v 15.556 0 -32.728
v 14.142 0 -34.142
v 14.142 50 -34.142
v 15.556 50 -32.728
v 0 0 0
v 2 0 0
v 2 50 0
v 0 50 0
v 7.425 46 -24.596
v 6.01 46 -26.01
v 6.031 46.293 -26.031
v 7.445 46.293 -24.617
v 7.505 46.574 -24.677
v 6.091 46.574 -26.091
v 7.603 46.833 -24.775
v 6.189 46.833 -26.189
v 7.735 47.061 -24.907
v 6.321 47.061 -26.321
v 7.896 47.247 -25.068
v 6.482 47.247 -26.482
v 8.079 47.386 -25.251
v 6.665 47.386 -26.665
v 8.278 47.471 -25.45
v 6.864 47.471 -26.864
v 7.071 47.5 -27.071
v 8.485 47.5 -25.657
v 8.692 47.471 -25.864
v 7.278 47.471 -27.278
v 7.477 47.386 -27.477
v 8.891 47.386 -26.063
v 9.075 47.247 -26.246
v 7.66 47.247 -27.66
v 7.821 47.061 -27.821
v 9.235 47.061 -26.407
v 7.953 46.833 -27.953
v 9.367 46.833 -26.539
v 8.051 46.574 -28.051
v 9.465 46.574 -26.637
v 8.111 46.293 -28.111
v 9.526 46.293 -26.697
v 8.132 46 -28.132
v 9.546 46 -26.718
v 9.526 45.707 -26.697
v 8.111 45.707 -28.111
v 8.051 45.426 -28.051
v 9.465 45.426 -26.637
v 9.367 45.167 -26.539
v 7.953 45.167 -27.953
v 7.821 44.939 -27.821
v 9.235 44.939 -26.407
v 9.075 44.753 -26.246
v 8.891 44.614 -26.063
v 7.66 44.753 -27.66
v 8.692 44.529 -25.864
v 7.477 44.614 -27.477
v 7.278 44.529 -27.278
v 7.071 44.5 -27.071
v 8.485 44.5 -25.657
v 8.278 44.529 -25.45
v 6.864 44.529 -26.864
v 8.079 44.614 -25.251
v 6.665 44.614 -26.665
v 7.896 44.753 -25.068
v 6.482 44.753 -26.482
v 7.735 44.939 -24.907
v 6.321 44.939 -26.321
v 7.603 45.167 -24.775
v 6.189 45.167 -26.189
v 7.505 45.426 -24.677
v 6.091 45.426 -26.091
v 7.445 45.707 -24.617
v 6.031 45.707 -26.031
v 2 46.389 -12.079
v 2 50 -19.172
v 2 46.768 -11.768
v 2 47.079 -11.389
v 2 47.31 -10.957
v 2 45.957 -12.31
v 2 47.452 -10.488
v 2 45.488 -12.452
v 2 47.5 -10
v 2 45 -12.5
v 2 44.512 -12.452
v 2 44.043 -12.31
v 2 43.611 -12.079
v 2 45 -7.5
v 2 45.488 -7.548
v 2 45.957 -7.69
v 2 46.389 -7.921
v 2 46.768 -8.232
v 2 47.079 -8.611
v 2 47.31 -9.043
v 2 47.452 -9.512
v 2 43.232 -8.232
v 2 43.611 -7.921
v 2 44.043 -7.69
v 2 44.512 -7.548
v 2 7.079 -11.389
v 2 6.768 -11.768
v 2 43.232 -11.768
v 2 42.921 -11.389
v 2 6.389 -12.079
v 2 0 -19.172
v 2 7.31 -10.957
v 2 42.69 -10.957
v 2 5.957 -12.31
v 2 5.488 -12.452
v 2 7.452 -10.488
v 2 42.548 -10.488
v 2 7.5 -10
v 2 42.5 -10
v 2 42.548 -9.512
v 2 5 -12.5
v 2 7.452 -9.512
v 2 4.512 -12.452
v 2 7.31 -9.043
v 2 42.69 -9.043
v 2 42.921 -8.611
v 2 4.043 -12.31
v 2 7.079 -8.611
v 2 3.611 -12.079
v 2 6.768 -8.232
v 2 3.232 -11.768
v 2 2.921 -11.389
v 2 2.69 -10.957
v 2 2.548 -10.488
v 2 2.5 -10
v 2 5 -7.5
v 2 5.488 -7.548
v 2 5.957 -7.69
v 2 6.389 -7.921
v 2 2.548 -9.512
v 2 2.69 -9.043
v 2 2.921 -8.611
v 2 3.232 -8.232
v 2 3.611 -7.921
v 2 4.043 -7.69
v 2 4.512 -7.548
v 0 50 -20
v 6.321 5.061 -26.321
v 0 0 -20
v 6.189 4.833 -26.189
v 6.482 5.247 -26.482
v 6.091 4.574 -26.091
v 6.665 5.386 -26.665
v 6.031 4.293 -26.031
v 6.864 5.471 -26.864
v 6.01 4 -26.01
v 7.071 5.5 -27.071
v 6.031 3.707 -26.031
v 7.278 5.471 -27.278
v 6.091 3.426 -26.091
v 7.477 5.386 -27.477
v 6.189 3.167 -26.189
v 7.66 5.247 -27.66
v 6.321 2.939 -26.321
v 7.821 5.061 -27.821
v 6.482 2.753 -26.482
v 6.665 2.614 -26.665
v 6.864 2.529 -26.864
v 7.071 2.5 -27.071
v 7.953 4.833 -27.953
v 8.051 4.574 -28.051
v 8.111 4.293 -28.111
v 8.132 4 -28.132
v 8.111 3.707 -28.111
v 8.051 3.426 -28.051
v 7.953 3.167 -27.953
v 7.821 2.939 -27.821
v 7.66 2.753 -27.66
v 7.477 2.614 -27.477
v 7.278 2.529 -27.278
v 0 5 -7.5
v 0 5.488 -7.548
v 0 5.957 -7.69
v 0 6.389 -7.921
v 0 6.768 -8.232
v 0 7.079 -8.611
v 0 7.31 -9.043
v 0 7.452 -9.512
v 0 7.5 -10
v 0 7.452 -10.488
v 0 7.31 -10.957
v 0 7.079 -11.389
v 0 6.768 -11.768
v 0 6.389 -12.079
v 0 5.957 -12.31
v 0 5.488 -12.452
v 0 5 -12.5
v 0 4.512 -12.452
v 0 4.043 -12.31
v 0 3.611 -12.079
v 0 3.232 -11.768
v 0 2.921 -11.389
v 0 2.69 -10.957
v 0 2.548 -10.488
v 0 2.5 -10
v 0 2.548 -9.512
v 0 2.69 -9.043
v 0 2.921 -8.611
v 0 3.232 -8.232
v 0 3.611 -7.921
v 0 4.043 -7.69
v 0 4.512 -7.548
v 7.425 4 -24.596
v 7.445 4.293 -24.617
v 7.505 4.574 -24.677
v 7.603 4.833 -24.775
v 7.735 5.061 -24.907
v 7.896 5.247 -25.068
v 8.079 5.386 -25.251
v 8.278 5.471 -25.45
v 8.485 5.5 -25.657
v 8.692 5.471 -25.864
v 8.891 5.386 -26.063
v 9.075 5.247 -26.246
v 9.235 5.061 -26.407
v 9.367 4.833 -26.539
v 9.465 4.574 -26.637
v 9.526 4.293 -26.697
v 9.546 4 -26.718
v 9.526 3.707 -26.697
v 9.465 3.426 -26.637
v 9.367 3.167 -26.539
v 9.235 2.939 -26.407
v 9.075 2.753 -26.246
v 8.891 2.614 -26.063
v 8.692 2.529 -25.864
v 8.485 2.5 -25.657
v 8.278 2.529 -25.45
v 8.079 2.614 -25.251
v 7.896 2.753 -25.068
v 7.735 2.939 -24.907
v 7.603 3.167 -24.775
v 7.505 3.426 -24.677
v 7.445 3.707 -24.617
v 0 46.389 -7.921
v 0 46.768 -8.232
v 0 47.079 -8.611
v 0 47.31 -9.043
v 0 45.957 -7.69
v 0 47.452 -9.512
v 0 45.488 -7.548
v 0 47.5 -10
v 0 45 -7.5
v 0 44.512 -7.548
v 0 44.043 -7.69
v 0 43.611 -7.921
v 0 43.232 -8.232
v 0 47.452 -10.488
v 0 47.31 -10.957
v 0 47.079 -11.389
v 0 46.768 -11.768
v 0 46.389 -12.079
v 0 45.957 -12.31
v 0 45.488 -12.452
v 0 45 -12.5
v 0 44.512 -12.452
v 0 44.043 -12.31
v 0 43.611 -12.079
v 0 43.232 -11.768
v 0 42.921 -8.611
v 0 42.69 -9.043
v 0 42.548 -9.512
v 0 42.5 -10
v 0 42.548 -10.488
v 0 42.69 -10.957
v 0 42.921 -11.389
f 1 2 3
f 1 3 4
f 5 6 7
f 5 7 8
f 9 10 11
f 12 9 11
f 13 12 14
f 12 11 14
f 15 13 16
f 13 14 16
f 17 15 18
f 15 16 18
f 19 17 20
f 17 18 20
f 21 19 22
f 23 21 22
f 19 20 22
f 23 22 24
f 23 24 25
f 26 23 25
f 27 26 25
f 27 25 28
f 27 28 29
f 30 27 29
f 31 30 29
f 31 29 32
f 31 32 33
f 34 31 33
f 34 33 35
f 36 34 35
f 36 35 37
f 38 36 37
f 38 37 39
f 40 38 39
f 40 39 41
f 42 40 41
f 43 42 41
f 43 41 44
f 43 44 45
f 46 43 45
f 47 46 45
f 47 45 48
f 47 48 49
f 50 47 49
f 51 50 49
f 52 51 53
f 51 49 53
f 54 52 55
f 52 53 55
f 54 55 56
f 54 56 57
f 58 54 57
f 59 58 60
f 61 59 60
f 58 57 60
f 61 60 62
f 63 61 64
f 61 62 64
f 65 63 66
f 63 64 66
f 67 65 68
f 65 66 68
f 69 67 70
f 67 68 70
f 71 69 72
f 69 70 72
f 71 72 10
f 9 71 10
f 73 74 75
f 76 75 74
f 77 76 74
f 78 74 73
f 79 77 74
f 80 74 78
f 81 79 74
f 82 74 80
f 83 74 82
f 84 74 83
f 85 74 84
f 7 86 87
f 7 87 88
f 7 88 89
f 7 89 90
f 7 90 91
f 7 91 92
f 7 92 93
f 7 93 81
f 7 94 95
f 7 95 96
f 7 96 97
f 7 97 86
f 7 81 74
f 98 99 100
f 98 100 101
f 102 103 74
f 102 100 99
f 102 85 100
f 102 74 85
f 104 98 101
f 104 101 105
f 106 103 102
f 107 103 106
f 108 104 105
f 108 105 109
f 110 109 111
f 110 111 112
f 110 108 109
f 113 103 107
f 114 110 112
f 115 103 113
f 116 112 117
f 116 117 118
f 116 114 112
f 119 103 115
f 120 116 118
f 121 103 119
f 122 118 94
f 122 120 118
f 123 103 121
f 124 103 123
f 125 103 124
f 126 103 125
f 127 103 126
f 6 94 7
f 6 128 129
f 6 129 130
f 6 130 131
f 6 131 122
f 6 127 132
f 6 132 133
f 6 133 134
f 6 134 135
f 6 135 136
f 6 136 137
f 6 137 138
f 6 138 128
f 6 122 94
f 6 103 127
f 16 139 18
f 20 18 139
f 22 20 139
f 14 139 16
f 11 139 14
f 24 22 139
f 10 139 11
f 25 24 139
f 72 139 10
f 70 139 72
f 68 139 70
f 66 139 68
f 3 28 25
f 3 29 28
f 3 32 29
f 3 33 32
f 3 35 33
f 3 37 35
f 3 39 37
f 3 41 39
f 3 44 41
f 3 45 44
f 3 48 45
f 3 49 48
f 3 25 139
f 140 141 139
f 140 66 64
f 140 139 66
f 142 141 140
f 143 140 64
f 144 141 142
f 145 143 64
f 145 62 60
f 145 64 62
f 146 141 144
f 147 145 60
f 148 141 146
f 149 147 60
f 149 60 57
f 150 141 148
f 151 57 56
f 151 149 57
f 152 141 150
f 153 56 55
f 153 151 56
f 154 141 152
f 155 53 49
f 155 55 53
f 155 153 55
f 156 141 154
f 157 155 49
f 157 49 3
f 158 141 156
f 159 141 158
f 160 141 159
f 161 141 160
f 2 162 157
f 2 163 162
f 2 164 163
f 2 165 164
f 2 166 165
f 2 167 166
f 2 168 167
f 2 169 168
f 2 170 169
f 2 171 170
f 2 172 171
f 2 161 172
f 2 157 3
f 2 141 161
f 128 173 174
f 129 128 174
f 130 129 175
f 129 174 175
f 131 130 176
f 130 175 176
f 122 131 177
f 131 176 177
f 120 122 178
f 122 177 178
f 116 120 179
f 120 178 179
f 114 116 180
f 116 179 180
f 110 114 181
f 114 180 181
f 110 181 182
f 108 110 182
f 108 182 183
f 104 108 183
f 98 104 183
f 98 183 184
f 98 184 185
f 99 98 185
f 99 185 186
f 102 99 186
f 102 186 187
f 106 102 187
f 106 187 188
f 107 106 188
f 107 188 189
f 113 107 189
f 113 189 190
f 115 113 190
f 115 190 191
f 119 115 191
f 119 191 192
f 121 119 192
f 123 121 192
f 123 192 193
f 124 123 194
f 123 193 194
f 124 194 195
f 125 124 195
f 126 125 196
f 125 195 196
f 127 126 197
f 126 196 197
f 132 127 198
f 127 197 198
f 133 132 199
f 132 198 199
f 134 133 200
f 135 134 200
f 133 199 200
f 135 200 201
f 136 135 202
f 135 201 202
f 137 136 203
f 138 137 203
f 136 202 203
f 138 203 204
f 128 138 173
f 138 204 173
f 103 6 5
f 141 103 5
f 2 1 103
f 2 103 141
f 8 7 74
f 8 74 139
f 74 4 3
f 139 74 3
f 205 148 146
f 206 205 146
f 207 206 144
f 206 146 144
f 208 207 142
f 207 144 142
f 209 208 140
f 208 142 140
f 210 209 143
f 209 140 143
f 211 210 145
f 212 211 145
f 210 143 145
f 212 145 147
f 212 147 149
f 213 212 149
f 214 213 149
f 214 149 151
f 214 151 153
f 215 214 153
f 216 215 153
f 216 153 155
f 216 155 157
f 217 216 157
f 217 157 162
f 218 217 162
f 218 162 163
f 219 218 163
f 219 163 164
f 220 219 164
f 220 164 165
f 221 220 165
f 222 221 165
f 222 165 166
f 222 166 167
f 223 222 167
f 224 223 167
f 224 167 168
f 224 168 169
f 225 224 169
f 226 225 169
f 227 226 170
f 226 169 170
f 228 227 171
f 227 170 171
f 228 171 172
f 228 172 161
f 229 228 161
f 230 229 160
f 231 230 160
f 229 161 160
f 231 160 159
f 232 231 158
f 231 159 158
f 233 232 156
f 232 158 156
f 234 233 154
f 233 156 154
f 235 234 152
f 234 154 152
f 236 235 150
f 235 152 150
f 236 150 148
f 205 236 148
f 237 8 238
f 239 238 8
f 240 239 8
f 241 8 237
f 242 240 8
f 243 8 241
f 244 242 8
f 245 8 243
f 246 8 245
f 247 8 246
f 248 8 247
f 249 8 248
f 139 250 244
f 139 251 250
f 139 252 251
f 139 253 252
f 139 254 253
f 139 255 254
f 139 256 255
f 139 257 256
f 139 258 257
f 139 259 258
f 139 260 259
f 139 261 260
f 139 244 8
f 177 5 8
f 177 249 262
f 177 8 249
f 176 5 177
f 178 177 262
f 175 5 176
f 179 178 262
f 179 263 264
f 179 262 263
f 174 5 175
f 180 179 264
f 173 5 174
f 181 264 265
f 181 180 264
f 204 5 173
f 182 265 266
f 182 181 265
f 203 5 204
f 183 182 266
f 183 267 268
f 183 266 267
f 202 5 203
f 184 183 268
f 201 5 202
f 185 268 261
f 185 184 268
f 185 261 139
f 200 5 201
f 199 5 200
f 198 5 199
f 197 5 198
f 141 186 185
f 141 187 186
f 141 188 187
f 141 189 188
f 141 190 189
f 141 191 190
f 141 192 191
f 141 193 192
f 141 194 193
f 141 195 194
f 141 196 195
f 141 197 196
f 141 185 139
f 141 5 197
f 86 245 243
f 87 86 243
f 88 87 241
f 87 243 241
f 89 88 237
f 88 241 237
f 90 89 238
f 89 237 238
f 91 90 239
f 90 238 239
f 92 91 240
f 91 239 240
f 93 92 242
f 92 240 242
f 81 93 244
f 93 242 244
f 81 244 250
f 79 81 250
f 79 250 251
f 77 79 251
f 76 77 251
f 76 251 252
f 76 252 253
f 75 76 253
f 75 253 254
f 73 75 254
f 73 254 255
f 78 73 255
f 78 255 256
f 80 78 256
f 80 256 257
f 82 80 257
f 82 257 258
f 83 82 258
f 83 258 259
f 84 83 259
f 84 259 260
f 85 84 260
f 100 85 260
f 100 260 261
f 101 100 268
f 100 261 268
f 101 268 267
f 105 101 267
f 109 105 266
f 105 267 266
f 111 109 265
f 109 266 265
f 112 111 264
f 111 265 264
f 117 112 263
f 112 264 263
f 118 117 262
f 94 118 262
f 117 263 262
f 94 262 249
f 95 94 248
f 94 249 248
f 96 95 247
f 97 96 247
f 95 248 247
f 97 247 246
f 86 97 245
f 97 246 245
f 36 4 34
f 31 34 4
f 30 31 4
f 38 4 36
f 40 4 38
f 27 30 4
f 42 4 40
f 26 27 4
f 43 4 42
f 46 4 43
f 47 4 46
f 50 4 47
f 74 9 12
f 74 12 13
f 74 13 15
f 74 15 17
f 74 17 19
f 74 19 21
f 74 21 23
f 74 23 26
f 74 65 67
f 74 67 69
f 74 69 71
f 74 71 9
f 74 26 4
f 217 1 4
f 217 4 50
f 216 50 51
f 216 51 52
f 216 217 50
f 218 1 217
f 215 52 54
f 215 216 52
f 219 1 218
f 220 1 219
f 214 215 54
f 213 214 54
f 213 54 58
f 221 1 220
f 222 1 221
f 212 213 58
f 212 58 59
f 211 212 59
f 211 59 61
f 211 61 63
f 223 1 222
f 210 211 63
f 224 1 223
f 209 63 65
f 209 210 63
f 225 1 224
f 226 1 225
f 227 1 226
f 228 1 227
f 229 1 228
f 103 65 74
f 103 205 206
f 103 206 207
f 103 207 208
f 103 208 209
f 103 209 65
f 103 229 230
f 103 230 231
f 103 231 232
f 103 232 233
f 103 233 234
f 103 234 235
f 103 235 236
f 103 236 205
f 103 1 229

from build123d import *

# Parameters (mm, degrees)
EXTRUSION1_DEPTH = 50
EXTRUSION2_REACH = 17.556
ESQUISSE3_R      = 2.5
EXTRUSION3_REACH = 27.142
ESQUISSE4_R      = 1.5


with BuildPart() as part:
    # Esquisse1 → Extrusion1 (new body)
    with BuildSketch(Plane(origin=(0, 0, 0), x_dir=(1, 0, 0), z_dir=(0, 1, 0))):
        Polygon((0, 0), (0, 20), (14.142135624, 34.142135624), (15.556349186, 32.727922061), (2, 19.171572875), (2, 0), align=None)
    extrude(amount=EXTRUSION1_DEPTH)

    # Esquisse3 → Extrusion2 (cut, up to next)
    with BuildSketch(Plane.ZY, mode=Mode.PRIVATE) as extrusion2_sk1:
        with Locations((-10, 5)):
            Circle(ESQUISSE3_R)
    extrusion2_tool1 = extrude(extrusion2_sk1.sketch, amount=-EXTRUSION2_REACH, mode=Mode.PRIVATE) & part.part
    add(extrusion2_tool1.solids().sort_by_distance((0, 5, -10))[0], mode=Mode.SUBTRACT)
    # Esquisse3 → Extrusion2 (cut, up to next)
    with BuildSketch(Plane.ZY, mode=Mode.PRIVATE) as extrusion2_sk2:
        with Locations((-10, 45)):
            Circle(ESQUISSE3_R)
    extrusion2_tool2 = extrude(extrusion2_sk2.sketch, amount=-EXTRUSION2_REACH, mode=Mode.PRIVATE) & part.part
    add(extrusion2_tool2.solids().sort_by_distance((0, 45, -10))[0], mode=Mode.SUBTRACT)

    # Esquisse4 → Extrusion3 (cut, up to next)
    with BuildSketch(Plane(origin=(-10, 0, -10), x_dir=(-0.707106781, 0, 0.707106781), z_dir=(-0.707106781, 0, -0.707106781)), mode=Mode.PRIVATE) as extrusion3_sk1:
        with Locations((-24.142135624, 46)):
            Circle(ESQUISSE4_R)
    extrusion3_tool1 = extrude(extrusion3_sk1.sketch, amount=-EXTRUSION3_REACH, mode=Mode.PRIVATE) & part.part
    add(extrusion3_tool1.solids().sort_by_distance((7.071068, 46, -27.071068))[0], mode=Mode.SUBTRACT)
    # Esquisse4 → Extrusion3 (cut, up to next)
    with BuildSketch(Plane(origin=(-10, 0, -10), x_dir=(-0.707106781, 0, 0.707106781), z_dir=(-0.707106781, 0, -0.707106781)), mode=Mode.PRIVATE) as extrusion3_sk2:
        with Locations((-24.142135624, 4)):
            Circle(ESQUISSE4_R)
    extrusion3_tool2 = extrude(extrusion3_sk2.sketch, amount=-EXTRUSION3_REACH, mode=Mode.PRIVATE) & part.part
    add(extrusion3_tool2.solids().sort_by_distance((7.071068, 4, -27.071068))[0], mode=Mode.SUBTRACT)


solid = part.part
